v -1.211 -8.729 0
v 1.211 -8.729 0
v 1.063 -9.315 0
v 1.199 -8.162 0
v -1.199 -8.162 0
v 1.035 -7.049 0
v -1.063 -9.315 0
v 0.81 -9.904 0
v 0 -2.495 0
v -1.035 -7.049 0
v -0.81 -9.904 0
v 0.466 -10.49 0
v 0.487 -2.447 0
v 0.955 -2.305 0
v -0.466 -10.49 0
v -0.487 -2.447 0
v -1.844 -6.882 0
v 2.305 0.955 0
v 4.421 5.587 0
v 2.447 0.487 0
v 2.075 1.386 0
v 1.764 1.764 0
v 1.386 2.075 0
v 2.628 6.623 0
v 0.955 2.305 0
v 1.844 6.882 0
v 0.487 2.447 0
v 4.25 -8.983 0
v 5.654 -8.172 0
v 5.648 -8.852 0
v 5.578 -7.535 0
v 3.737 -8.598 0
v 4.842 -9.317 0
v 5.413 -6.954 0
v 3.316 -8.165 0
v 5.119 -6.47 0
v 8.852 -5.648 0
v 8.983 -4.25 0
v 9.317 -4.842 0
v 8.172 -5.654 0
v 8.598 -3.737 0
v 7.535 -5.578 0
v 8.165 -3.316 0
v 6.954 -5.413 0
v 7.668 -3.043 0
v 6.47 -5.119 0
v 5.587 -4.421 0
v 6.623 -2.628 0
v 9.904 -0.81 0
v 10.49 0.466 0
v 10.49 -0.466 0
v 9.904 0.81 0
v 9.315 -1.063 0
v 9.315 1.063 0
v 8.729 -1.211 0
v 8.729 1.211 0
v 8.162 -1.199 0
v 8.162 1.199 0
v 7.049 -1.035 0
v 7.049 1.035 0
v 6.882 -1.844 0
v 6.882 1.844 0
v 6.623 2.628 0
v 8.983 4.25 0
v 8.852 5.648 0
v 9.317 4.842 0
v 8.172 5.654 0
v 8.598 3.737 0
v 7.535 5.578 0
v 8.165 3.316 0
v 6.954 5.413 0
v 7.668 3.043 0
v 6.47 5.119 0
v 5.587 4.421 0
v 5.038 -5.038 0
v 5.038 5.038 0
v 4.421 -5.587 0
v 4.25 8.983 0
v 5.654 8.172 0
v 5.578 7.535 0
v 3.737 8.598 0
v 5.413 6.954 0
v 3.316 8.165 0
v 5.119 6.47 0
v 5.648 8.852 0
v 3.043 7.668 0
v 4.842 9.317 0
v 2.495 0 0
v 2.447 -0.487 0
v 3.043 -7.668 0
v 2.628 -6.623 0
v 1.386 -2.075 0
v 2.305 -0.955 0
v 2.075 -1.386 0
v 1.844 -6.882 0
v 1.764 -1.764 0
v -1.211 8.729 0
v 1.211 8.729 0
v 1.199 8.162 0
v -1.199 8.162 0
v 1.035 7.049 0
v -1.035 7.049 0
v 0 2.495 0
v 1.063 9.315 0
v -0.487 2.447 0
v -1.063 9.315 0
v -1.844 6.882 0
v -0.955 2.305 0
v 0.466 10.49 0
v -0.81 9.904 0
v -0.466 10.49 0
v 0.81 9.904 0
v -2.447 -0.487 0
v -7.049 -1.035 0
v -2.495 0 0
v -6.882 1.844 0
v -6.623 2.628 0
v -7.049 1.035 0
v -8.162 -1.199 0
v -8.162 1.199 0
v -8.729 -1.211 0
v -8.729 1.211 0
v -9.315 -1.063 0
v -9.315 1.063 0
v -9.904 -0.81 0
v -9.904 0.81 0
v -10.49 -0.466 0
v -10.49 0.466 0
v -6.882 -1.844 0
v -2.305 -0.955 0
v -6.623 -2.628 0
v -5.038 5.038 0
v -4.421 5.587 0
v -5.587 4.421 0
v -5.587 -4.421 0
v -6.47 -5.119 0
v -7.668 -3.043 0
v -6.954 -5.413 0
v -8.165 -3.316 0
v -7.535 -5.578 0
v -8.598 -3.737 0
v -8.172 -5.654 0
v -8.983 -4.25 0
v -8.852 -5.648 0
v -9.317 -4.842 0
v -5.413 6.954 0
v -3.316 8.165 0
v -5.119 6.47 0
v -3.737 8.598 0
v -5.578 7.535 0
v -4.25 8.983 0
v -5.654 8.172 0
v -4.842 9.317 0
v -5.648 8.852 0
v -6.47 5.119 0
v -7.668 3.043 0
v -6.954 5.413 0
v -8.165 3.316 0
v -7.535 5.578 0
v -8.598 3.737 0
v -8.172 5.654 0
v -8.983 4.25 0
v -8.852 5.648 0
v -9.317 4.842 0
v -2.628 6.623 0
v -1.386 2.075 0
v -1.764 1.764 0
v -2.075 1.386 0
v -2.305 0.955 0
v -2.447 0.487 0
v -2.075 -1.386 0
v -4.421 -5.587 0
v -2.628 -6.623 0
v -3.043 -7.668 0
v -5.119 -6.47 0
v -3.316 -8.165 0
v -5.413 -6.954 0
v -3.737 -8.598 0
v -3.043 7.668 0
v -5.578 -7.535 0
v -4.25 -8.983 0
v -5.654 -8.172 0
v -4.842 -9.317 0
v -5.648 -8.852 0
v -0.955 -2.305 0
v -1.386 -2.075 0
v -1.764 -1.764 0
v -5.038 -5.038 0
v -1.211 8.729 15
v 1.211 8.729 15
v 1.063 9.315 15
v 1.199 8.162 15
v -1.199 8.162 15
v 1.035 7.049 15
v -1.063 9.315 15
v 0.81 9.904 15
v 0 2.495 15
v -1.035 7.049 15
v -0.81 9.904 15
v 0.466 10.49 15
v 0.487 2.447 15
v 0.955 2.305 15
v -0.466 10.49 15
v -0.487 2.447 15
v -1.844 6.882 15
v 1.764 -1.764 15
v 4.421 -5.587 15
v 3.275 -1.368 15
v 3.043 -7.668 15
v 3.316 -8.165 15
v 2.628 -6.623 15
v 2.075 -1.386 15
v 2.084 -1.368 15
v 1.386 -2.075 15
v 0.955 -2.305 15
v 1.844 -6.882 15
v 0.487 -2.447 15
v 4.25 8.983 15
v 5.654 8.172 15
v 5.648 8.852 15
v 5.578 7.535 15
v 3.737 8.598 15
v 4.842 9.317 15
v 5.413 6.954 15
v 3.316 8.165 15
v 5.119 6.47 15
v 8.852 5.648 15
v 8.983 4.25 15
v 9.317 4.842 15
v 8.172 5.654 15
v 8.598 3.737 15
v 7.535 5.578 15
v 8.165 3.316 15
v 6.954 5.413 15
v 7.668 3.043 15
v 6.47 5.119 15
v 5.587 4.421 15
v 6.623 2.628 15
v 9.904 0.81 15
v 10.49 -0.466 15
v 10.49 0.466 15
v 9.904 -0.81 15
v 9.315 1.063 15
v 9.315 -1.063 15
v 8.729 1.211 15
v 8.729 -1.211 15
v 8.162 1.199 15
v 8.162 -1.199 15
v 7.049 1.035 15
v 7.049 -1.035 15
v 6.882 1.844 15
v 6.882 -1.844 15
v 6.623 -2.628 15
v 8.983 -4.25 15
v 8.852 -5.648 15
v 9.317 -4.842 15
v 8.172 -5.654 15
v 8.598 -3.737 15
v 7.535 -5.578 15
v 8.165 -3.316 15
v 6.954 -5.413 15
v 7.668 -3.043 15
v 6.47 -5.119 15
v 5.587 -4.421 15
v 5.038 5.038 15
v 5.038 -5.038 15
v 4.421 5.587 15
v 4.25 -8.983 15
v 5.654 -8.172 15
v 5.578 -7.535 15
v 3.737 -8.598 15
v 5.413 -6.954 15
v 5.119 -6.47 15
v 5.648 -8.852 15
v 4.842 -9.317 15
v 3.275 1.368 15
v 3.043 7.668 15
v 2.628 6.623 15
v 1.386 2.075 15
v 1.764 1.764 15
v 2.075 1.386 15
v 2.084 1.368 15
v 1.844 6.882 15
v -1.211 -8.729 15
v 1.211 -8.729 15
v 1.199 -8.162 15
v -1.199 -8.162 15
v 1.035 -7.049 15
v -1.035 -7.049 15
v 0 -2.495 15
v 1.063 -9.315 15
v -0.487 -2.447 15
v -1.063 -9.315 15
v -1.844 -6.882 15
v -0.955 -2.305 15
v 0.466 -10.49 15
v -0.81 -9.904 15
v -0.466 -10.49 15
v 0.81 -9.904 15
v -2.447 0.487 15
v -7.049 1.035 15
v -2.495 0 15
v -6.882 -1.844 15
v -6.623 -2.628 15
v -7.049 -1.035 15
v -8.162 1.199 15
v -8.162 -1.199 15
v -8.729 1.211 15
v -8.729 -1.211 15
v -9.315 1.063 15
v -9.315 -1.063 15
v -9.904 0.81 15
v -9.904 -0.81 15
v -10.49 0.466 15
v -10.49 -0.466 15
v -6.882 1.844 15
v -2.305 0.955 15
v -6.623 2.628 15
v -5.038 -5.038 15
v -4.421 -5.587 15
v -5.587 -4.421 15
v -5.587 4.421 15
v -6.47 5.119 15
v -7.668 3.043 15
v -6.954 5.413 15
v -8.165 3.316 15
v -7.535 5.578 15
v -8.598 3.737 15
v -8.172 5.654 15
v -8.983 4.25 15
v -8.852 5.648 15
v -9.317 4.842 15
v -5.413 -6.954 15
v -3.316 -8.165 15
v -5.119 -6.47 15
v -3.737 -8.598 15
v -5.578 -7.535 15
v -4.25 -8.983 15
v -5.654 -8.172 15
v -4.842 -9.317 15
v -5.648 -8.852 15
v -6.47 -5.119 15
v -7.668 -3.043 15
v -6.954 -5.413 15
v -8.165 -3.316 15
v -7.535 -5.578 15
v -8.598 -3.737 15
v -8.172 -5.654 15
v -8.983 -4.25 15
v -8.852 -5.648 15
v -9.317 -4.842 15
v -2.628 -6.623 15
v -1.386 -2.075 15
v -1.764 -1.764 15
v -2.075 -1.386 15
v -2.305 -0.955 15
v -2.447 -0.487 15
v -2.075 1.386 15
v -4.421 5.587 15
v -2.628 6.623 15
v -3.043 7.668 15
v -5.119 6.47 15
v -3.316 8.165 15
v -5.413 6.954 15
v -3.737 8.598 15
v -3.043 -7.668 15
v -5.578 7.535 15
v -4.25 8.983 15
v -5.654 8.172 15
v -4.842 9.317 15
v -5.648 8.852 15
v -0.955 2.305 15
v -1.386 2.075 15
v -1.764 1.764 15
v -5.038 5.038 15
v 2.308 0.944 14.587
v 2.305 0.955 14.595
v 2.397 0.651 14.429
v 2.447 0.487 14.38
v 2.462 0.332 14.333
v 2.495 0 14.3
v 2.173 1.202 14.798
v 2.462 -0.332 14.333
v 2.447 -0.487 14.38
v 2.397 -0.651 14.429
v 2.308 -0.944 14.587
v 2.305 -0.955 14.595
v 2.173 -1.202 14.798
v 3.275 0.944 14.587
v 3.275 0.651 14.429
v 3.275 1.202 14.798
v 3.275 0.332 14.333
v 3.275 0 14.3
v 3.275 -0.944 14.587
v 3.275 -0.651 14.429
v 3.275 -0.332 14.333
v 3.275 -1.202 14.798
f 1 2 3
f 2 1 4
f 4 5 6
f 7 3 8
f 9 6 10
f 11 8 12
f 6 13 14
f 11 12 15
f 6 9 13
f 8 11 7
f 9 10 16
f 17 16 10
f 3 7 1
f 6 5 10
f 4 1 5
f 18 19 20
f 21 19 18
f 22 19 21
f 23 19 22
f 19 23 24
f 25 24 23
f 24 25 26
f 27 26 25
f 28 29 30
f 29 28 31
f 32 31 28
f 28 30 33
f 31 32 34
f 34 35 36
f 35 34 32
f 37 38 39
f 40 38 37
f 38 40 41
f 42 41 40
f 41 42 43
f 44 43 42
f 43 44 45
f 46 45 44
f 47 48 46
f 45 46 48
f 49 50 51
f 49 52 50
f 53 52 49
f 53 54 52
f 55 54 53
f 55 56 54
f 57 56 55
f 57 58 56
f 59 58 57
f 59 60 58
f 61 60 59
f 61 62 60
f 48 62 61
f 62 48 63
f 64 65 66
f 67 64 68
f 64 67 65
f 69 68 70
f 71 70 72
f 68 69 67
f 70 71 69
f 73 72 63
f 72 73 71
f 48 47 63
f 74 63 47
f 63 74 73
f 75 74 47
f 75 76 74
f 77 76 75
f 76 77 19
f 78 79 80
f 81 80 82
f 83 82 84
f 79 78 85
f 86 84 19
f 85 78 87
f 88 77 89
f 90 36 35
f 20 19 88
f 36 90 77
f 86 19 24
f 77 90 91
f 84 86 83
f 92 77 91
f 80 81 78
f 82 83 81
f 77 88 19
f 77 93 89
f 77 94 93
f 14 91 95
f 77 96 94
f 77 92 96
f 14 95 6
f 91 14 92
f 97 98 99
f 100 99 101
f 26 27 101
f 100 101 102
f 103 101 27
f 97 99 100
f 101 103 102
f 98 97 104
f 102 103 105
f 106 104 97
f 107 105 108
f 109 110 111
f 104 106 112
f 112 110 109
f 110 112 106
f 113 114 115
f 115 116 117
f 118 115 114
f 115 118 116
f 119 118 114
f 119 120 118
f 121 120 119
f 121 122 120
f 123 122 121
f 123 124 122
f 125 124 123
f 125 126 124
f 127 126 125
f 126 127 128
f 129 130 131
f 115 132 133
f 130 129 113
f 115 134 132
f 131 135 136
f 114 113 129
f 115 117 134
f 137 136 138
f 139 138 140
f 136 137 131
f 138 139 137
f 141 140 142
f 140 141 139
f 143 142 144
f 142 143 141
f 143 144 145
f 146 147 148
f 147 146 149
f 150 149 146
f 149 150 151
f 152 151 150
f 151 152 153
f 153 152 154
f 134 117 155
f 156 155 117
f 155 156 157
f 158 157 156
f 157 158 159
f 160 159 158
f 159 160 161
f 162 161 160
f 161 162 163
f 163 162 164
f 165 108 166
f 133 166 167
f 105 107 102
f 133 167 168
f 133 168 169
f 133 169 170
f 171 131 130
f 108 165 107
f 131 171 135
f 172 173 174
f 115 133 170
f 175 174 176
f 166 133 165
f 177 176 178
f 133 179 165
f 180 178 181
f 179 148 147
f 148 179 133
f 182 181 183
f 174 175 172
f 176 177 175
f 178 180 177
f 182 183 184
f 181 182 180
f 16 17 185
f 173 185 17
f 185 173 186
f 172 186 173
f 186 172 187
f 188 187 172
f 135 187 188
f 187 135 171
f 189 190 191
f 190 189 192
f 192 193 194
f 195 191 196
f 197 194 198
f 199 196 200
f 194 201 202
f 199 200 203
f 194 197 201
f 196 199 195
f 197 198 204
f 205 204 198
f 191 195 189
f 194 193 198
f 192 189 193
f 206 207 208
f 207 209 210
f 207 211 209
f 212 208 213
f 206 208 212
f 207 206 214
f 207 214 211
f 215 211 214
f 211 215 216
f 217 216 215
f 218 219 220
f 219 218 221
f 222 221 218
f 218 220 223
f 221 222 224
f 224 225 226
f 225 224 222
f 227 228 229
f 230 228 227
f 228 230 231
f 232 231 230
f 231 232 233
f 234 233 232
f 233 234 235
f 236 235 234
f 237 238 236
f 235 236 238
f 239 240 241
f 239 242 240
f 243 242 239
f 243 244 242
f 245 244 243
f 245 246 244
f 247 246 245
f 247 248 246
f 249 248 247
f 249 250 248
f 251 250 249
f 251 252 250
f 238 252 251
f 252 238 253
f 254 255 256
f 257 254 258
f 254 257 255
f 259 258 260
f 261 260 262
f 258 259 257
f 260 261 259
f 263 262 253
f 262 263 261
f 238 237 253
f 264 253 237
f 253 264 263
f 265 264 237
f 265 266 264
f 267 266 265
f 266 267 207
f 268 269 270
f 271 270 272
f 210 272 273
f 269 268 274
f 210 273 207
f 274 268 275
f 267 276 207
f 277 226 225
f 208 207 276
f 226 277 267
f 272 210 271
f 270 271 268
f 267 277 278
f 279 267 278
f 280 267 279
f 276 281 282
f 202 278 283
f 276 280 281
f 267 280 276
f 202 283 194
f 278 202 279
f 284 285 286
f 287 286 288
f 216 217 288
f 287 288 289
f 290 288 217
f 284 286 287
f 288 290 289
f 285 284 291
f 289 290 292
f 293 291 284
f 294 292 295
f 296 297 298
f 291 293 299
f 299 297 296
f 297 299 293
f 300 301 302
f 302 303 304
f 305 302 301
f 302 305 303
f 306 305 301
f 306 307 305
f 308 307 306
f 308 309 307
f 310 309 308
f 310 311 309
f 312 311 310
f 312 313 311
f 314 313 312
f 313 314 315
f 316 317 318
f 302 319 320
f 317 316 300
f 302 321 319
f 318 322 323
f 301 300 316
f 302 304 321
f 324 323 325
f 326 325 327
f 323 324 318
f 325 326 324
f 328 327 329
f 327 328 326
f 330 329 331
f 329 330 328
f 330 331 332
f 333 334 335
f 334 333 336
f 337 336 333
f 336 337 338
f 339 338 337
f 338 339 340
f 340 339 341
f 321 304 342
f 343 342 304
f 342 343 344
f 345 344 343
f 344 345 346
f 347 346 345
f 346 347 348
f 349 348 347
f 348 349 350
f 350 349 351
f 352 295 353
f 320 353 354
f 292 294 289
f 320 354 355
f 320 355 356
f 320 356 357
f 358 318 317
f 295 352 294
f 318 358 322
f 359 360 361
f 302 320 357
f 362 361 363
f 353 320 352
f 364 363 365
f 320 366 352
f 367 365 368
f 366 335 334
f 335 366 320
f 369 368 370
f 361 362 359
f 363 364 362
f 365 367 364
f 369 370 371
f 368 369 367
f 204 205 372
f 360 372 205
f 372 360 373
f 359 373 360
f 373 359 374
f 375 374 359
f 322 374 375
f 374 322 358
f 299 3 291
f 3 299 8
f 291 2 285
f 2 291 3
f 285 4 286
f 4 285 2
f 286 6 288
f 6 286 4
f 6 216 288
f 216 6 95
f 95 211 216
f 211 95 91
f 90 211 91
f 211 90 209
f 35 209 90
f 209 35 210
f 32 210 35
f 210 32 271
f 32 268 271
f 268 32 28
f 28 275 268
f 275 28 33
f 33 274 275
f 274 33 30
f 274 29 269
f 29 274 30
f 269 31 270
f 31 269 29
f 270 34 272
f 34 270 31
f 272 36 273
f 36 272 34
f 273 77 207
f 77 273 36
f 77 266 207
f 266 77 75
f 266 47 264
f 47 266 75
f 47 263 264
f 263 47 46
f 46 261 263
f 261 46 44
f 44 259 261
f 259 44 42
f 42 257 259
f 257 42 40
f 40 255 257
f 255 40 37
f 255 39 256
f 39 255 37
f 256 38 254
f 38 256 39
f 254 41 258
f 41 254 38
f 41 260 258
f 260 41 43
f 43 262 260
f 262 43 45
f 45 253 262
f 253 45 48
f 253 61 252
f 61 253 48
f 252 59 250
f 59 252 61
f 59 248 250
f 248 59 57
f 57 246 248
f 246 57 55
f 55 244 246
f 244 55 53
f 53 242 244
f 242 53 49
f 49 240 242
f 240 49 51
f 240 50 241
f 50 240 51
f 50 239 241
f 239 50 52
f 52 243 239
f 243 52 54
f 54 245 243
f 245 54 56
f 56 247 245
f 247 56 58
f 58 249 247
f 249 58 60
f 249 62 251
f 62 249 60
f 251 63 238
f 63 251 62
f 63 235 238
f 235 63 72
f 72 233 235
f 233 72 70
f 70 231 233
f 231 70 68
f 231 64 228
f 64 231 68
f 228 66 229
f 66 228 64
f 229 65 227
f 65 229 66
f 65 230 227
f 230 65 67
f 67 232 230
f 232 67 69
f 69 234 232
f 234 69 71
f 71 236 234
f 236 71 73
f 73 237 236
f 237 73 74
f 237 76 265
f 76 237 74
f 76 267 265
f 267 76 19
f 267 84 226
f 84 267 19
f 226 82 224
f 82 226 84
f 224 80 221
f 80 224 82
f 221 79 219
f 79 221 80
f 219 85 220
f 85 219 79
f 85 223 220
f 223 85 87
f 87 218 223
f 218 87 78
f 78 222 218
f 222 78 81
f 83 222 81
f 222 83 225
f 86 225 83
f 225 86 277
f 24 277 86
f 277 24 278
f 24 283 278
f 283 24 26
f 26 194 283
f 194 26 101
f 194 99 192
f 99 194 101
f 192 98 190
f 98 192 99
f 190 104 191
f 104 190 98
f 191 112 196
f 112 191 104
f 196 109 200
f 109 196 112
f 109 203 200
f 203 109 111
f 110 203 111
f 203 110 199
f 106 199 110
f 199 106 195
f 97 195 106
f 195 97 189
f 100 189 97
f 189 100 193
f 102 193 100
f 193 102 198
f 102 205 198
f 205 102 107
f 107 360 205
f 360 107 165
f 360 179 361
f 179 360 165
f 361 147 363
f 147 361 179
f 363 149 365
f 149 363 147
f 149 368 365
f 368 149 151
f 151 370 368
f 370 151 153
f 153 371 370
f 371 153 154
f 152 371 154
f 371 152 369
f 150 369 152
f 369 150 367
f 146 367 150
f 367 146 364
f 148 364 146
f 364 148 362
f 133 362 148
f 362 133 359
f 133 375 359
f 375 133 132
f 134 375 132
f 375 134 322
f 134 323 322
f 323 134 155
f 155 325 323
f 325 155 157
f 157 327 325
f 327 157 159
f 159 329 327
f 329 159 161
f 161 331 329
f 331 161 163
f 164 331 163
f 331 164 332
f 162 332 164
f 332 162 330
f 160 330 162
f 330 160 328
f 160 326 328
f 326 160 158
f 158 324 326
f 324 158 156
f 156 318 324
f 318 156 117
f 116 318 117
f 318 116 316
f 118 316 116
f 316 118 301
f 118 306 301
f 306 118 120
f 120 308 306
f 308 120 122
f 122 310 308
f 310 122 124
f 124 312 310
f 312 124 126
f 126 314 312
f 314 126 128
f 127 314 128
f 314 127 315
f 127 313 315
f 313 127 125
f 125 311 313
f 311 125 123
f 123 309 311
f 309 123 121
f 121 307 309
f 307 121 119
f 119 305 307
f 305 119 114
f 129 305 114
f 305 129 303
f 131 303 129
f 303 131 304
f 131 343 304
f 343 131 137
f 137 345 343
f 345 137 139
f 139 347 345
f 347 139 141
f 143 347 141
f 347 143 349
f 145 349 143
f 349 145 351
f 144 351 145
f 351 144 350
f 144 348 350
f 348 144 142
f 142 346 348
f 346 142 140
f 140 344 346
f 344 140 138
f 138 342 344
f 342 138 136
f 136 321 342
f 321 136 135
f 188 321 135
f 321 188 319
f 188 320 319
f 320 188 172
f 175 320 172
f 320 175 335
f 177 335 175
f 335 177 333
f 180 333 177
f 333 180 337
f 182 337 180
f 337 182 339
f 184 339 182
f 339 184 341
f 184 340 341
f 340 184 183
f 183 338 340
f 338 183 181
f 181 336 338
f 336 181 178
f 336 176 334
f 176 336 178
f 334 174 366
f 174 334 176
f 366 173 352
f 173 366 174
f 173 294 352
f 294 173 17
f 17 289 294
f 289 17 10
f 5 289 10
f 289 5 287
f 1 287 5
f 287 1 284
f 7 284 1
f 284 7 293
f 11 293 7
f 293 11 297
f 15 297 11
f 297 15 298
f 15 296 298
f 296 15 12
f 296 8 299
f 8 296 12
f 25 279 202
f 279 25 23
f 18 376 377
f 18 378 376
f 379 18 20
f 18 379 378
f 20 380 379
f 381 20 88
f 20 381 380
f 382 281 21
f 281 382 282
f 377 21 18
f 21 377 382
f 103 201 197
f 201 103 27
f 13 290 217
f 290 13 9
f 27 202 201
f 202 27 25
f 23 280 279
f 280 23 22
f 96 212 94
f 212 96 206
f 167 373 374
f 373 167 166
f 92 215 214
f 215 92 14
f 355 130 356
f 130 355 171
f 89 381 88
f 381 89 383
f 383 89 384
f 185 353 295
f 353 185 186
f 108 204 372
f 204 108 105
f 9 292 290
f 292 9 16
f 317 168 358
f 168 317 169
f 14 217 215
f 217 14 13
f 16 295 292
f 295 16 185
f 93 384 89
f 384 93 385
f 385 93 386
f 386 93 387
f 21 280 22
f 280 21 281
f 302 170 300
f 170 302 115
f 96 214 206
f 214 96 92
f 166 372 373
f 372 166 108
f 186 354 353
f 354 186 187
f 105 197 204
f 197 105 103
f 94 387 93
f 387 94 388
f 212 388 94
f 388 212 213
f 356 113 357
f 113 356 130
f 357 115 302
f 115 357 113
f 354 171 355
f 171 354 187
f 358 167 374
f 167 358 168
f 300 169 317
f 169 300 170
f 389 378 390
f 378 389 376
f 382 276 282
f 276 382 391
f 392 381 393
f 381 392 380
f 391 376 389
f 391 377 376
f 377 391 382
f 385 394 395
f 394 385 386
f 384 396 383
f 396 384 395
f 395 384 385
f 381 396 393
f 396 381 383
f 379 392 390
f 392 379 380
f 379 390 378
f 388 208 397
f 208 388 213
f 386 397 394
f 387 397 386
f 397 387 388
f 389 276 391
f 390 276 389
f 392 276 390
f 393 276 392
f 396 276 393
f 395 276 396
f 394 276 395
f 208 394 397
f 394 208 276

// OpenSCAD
$fn = 32;

// ----------------------------------------------------------------------
// Spur gear: m=1.5 z=12, 21 mm tip diameter x 15 mm
// ----------------------------------------------------------------------

// --- parameters (mm) ---
modul = 1.5;              // module
n_teeth = 12;             // number of teeth
width = 15;               // face width
pa = 20;                  // pressure angle, deg
shaft_d = 4.99;           // shaft bore
set_d = 3.4;              // set screw tap hole
set_z = 16;               // set screw height

/* --- involute profile --- */
pitch_r = modul * n_teeth / 2;
base_r = pitch_r * cos(pa);
tip_r = pitch_r + modul;
root_r = pitch_r - 1.25 * modul;
flank_steps = 6;

function inv_deg(a) = (tan(a) - a * PI / 180) * 180 / PI;
function flank_r(i) = root_r + (tip_r - root_r) * i / flank_steps;
function half_angle(r) = 90 / n_teeth + inv_deg(pa) - inv_deg(acos(min(1, base_r / r)));
function tooth_pt(k, i, side) =
    let (r = flank_r(i), a = k * 360 / n_teeth + side * half_angle(r))
    [r * cos(a), r * sin(a)];

module tooth_profile() {
  polygon(points = [
    for (k = [0 : n_teeth - 1])
      each [
        for (i = [0 : flank_steps]) tooth_pt(k, i, -1),
        for (i = [flank_steps : -1 : 0]) tooth_pt(k, i, 1),
        let (ta = (k + 0.5) * 360 / n_teeth)
          [root_r * cos(ta), root_r * sin(ta)]
      ]
  ]);
}

module gear_disc() {
  linear_extrude(height = width) tooth_profile();
}

difference() {
  gear_disc();
  translate([0, 0, -1]) cylinder(h = width + 3, d = shaft_d);
  /* set screw, drilled radially */
  translate([-1, 0, set_z]) rotate([0, 90, 0]) cylinder(h = (root_r * 0.6), d = set_d);
}
